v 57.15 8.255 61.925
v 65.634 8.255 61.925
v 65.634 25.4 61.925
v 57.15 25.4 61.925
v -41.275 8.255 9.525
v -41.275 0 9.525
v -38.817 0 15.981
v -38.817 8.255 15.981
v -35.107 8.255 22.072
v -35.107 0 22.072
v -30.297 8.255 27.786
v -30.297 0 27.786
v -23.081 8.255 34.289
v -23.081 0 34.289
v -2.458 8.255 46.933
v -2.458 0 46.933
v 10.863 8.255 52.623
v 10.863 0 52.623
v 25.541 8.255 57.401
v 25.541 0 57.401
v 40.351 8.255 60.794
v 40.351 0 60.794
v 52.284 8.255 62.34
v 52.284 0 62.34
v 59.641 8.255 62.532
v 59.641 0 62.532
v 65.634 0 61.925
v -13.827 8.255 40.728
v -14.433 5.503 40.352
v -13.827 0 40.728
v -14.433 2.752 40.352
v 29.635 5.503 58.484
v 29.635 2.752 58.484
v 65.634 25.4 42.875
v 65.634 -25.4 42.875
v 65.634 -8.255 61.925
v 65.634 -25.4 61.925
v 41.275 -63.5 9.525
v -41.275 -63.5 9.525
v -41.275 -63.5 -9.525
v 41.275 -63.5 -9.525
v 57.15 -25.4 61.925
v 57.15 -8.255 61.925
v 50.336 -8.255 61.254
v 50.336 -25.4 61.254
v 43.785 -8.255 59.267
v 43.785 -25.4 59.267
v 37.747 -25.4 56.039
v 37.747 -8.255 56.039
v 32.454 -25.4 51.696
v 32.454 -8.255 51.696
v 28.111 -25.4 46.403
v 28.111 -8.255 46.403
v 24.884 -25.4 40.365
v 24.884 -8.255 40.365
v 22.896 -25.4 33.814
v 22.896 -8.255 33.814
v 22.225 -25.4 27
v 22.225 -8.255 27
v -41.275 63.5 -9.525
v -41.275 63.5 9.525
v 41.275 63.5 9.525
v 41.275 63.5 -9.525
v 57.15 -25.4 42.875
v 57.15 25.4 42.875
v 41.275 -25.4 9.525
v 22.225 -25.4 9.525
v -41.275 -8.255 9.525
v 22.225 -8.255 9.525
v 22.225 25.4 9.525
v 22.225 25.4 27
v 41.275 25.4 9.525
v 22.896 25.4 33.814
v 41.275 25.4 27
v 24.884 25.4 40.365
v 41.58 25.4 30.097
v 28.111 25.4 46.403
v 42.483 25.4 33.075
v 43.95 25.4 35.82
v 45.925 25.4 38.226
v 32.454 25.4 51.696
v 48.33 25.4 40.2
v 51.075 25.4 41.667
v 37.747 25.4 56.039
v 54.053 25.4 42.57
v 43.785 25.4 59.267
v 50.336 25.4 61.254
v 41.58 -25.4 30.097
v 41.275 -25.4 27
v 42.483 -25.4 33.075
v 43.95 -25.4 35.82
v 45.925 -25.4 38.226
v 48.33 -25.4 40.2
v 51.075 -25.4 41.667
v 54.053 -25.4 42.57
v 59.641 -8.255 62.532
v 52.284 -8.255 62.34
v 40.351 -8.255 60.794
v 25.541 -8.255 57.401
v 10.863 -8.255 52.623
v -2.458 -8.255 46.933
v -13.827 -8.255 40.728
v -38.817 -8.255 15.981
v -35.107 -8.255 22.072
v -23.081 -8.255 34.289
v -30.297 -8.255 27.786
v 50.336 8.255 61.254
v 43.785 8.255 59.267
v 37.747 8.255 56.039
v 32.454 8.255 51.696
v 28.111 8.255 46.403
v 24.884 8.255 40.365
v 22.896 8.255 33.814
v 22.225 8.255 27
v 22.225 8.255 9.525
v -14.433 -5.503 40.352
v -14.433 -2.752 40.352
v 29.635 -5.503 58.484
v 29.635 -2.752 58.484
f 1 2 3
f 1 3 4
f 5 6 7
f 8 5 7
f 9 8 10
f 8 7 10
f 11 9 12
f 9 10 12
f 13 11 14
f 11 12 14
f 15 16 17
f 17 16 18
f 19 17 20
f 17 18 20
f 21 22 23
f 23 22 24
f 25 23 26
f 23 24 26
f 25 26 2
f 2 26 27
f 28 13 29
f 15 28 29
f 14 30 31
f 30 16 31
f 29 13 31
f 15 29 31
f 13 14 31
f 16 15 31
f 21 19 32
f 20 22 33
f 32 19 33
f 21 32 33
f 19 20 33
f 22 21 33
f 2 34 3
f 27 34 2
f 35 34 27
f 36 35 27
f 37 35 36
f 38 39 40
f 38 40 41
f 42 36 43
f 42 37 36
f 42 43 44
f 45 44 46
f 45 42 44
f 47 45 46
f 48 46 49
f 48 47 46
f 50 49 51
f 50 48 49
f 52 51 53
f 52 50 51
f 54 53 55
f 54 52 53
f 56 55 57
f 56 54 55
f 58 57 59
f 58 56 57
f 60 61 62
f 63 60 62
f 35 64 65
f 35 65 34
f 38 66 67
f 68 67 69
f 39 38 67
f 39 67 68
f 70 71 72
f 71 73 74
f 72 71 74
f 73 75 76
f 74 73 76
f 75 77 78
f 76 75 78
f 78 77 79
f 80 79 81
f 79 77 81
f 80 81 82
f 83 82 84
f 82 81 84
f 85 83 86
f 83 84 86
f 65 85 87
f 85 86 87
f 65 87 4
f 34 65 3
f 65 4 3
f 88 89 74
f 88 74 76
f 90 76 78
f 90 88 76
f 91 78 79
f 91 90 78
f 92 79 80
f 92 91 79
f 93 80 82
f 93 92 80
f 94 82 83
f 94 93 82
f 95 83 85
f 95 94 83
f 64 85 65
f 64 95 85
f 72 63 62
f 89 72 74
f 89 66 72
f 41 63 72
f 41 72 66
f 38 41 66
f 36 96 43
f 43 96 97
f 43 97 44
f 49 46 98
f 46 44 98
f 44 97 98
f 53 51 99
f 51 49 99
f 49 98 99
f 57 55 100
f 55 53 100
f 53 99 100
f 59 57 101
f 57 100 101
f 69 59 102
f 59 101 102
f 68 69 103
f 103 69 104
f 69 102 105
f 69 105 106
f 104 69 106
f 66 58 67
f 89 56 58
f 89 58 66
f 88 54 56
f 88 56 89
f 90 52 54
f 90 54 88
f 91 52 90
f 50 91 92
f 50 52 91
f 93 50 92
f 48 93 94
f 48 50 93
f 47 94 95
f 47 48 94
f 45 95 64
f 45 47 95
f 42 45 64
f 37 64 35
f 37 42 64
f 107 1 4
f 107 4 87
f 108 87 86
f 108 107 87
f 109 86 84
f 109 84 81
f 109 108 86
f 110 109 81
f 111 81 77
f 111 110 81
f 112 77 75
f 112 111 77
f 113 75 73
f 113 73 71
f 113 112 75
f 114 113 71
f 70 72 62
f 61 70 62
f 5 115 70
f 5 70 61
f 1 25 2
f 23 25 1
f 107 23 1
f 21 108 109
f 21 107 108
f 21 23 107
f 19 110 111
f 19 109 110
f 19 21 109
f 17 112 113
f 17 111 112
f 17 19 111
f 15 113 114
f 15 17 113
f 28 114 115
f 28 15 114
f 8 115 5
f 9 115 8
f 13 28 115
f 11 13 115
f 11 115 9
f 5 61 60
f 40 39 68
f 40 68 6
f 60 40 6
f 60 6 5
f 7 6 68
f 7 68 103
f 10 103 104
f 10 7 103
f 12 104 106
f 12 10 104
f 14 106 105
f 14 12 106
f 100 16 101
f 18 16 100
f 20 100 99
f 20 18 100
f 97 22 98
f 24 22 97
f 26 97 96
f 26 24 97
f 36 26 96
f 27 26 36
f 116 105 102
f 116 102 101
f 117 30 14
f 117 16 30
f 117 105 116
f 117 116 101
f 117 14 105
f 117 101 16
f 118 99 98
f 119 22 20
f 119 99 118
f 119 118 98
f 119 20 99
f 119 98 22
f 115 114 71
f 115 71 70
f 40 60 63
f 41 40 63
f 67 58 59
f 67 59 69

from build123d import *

# Parameters (mm, degrees)
F1_DEPTH = 63.5
F2_DEPTH = 25.4
F3_DEPTH = 8.255


with BuildPart() as f1:
    # F0 (on Front) → F1 (new body, symmetric)
    with BuildSketch(Plane.XZ):
        Polygon((22.225, 9.525), (-41.275, 9.525), (-41.275, -9.525), (41.275, -9.525), (41.275, 9.525), align=None)
    extrude(amount=F1_DEPTH, both=True)

    # F0 (on Front) → F2 (join, symmetric)
    with BuildSketch(Plane.XZ):
        with BuildLine():
            Line((22.225, 27.0002), (22.225, 9.525))
            Line((22.225, 9.525), (41.275, 9.525))
            Line((41.275, 9.525), (41.275, 27.0002))
            ThreePointArc((41.275, 27.0002), (45.92468, 38.22552), (57.15, 42.8752))
            Line((57.15, 42.8752), (65.634008, 42.8752))
            Line((65.634008, 42.8752), (65.634008, 61.9252))
            Line((65.634008, 61.9252), (57.15, 61.9252))
            ThreePointArc((57.15, 61.9252), (32.454296, 51.695904), (22.225, 27.0002))
        make_face()
    extrude(amount=F2_DEPTH, both=True)

    # F0 (on Front) → F3 (join, symmetric)
    with BuildSketch(Plane.XZ):
        with BuildLine():
            add(Edge.make_bspline(
                [(-41.275, 9.525), (-31.476464, 46.034317), (42.099748, 66.494018), (65.634008, 61.9252)],
                knots=[0, 0, 0, 0, 119.06014, 119.06014, 119.06014, 119.06014], degree=3))
            Line((-41.275, 9.525), (22.225, 9.525))
            Line((22.225, 9.525), (22.225, 27.0002))
            ThreePointArc((22.225, 27.0002), (32.454296, 51.695904), (57.15, 61.9252))
            Line((57.15, 61.9252), (65.634008, 61.9252))
        make_face()
    extrude(amount=F3_DEPTH, both=True)


solid = f1.part
